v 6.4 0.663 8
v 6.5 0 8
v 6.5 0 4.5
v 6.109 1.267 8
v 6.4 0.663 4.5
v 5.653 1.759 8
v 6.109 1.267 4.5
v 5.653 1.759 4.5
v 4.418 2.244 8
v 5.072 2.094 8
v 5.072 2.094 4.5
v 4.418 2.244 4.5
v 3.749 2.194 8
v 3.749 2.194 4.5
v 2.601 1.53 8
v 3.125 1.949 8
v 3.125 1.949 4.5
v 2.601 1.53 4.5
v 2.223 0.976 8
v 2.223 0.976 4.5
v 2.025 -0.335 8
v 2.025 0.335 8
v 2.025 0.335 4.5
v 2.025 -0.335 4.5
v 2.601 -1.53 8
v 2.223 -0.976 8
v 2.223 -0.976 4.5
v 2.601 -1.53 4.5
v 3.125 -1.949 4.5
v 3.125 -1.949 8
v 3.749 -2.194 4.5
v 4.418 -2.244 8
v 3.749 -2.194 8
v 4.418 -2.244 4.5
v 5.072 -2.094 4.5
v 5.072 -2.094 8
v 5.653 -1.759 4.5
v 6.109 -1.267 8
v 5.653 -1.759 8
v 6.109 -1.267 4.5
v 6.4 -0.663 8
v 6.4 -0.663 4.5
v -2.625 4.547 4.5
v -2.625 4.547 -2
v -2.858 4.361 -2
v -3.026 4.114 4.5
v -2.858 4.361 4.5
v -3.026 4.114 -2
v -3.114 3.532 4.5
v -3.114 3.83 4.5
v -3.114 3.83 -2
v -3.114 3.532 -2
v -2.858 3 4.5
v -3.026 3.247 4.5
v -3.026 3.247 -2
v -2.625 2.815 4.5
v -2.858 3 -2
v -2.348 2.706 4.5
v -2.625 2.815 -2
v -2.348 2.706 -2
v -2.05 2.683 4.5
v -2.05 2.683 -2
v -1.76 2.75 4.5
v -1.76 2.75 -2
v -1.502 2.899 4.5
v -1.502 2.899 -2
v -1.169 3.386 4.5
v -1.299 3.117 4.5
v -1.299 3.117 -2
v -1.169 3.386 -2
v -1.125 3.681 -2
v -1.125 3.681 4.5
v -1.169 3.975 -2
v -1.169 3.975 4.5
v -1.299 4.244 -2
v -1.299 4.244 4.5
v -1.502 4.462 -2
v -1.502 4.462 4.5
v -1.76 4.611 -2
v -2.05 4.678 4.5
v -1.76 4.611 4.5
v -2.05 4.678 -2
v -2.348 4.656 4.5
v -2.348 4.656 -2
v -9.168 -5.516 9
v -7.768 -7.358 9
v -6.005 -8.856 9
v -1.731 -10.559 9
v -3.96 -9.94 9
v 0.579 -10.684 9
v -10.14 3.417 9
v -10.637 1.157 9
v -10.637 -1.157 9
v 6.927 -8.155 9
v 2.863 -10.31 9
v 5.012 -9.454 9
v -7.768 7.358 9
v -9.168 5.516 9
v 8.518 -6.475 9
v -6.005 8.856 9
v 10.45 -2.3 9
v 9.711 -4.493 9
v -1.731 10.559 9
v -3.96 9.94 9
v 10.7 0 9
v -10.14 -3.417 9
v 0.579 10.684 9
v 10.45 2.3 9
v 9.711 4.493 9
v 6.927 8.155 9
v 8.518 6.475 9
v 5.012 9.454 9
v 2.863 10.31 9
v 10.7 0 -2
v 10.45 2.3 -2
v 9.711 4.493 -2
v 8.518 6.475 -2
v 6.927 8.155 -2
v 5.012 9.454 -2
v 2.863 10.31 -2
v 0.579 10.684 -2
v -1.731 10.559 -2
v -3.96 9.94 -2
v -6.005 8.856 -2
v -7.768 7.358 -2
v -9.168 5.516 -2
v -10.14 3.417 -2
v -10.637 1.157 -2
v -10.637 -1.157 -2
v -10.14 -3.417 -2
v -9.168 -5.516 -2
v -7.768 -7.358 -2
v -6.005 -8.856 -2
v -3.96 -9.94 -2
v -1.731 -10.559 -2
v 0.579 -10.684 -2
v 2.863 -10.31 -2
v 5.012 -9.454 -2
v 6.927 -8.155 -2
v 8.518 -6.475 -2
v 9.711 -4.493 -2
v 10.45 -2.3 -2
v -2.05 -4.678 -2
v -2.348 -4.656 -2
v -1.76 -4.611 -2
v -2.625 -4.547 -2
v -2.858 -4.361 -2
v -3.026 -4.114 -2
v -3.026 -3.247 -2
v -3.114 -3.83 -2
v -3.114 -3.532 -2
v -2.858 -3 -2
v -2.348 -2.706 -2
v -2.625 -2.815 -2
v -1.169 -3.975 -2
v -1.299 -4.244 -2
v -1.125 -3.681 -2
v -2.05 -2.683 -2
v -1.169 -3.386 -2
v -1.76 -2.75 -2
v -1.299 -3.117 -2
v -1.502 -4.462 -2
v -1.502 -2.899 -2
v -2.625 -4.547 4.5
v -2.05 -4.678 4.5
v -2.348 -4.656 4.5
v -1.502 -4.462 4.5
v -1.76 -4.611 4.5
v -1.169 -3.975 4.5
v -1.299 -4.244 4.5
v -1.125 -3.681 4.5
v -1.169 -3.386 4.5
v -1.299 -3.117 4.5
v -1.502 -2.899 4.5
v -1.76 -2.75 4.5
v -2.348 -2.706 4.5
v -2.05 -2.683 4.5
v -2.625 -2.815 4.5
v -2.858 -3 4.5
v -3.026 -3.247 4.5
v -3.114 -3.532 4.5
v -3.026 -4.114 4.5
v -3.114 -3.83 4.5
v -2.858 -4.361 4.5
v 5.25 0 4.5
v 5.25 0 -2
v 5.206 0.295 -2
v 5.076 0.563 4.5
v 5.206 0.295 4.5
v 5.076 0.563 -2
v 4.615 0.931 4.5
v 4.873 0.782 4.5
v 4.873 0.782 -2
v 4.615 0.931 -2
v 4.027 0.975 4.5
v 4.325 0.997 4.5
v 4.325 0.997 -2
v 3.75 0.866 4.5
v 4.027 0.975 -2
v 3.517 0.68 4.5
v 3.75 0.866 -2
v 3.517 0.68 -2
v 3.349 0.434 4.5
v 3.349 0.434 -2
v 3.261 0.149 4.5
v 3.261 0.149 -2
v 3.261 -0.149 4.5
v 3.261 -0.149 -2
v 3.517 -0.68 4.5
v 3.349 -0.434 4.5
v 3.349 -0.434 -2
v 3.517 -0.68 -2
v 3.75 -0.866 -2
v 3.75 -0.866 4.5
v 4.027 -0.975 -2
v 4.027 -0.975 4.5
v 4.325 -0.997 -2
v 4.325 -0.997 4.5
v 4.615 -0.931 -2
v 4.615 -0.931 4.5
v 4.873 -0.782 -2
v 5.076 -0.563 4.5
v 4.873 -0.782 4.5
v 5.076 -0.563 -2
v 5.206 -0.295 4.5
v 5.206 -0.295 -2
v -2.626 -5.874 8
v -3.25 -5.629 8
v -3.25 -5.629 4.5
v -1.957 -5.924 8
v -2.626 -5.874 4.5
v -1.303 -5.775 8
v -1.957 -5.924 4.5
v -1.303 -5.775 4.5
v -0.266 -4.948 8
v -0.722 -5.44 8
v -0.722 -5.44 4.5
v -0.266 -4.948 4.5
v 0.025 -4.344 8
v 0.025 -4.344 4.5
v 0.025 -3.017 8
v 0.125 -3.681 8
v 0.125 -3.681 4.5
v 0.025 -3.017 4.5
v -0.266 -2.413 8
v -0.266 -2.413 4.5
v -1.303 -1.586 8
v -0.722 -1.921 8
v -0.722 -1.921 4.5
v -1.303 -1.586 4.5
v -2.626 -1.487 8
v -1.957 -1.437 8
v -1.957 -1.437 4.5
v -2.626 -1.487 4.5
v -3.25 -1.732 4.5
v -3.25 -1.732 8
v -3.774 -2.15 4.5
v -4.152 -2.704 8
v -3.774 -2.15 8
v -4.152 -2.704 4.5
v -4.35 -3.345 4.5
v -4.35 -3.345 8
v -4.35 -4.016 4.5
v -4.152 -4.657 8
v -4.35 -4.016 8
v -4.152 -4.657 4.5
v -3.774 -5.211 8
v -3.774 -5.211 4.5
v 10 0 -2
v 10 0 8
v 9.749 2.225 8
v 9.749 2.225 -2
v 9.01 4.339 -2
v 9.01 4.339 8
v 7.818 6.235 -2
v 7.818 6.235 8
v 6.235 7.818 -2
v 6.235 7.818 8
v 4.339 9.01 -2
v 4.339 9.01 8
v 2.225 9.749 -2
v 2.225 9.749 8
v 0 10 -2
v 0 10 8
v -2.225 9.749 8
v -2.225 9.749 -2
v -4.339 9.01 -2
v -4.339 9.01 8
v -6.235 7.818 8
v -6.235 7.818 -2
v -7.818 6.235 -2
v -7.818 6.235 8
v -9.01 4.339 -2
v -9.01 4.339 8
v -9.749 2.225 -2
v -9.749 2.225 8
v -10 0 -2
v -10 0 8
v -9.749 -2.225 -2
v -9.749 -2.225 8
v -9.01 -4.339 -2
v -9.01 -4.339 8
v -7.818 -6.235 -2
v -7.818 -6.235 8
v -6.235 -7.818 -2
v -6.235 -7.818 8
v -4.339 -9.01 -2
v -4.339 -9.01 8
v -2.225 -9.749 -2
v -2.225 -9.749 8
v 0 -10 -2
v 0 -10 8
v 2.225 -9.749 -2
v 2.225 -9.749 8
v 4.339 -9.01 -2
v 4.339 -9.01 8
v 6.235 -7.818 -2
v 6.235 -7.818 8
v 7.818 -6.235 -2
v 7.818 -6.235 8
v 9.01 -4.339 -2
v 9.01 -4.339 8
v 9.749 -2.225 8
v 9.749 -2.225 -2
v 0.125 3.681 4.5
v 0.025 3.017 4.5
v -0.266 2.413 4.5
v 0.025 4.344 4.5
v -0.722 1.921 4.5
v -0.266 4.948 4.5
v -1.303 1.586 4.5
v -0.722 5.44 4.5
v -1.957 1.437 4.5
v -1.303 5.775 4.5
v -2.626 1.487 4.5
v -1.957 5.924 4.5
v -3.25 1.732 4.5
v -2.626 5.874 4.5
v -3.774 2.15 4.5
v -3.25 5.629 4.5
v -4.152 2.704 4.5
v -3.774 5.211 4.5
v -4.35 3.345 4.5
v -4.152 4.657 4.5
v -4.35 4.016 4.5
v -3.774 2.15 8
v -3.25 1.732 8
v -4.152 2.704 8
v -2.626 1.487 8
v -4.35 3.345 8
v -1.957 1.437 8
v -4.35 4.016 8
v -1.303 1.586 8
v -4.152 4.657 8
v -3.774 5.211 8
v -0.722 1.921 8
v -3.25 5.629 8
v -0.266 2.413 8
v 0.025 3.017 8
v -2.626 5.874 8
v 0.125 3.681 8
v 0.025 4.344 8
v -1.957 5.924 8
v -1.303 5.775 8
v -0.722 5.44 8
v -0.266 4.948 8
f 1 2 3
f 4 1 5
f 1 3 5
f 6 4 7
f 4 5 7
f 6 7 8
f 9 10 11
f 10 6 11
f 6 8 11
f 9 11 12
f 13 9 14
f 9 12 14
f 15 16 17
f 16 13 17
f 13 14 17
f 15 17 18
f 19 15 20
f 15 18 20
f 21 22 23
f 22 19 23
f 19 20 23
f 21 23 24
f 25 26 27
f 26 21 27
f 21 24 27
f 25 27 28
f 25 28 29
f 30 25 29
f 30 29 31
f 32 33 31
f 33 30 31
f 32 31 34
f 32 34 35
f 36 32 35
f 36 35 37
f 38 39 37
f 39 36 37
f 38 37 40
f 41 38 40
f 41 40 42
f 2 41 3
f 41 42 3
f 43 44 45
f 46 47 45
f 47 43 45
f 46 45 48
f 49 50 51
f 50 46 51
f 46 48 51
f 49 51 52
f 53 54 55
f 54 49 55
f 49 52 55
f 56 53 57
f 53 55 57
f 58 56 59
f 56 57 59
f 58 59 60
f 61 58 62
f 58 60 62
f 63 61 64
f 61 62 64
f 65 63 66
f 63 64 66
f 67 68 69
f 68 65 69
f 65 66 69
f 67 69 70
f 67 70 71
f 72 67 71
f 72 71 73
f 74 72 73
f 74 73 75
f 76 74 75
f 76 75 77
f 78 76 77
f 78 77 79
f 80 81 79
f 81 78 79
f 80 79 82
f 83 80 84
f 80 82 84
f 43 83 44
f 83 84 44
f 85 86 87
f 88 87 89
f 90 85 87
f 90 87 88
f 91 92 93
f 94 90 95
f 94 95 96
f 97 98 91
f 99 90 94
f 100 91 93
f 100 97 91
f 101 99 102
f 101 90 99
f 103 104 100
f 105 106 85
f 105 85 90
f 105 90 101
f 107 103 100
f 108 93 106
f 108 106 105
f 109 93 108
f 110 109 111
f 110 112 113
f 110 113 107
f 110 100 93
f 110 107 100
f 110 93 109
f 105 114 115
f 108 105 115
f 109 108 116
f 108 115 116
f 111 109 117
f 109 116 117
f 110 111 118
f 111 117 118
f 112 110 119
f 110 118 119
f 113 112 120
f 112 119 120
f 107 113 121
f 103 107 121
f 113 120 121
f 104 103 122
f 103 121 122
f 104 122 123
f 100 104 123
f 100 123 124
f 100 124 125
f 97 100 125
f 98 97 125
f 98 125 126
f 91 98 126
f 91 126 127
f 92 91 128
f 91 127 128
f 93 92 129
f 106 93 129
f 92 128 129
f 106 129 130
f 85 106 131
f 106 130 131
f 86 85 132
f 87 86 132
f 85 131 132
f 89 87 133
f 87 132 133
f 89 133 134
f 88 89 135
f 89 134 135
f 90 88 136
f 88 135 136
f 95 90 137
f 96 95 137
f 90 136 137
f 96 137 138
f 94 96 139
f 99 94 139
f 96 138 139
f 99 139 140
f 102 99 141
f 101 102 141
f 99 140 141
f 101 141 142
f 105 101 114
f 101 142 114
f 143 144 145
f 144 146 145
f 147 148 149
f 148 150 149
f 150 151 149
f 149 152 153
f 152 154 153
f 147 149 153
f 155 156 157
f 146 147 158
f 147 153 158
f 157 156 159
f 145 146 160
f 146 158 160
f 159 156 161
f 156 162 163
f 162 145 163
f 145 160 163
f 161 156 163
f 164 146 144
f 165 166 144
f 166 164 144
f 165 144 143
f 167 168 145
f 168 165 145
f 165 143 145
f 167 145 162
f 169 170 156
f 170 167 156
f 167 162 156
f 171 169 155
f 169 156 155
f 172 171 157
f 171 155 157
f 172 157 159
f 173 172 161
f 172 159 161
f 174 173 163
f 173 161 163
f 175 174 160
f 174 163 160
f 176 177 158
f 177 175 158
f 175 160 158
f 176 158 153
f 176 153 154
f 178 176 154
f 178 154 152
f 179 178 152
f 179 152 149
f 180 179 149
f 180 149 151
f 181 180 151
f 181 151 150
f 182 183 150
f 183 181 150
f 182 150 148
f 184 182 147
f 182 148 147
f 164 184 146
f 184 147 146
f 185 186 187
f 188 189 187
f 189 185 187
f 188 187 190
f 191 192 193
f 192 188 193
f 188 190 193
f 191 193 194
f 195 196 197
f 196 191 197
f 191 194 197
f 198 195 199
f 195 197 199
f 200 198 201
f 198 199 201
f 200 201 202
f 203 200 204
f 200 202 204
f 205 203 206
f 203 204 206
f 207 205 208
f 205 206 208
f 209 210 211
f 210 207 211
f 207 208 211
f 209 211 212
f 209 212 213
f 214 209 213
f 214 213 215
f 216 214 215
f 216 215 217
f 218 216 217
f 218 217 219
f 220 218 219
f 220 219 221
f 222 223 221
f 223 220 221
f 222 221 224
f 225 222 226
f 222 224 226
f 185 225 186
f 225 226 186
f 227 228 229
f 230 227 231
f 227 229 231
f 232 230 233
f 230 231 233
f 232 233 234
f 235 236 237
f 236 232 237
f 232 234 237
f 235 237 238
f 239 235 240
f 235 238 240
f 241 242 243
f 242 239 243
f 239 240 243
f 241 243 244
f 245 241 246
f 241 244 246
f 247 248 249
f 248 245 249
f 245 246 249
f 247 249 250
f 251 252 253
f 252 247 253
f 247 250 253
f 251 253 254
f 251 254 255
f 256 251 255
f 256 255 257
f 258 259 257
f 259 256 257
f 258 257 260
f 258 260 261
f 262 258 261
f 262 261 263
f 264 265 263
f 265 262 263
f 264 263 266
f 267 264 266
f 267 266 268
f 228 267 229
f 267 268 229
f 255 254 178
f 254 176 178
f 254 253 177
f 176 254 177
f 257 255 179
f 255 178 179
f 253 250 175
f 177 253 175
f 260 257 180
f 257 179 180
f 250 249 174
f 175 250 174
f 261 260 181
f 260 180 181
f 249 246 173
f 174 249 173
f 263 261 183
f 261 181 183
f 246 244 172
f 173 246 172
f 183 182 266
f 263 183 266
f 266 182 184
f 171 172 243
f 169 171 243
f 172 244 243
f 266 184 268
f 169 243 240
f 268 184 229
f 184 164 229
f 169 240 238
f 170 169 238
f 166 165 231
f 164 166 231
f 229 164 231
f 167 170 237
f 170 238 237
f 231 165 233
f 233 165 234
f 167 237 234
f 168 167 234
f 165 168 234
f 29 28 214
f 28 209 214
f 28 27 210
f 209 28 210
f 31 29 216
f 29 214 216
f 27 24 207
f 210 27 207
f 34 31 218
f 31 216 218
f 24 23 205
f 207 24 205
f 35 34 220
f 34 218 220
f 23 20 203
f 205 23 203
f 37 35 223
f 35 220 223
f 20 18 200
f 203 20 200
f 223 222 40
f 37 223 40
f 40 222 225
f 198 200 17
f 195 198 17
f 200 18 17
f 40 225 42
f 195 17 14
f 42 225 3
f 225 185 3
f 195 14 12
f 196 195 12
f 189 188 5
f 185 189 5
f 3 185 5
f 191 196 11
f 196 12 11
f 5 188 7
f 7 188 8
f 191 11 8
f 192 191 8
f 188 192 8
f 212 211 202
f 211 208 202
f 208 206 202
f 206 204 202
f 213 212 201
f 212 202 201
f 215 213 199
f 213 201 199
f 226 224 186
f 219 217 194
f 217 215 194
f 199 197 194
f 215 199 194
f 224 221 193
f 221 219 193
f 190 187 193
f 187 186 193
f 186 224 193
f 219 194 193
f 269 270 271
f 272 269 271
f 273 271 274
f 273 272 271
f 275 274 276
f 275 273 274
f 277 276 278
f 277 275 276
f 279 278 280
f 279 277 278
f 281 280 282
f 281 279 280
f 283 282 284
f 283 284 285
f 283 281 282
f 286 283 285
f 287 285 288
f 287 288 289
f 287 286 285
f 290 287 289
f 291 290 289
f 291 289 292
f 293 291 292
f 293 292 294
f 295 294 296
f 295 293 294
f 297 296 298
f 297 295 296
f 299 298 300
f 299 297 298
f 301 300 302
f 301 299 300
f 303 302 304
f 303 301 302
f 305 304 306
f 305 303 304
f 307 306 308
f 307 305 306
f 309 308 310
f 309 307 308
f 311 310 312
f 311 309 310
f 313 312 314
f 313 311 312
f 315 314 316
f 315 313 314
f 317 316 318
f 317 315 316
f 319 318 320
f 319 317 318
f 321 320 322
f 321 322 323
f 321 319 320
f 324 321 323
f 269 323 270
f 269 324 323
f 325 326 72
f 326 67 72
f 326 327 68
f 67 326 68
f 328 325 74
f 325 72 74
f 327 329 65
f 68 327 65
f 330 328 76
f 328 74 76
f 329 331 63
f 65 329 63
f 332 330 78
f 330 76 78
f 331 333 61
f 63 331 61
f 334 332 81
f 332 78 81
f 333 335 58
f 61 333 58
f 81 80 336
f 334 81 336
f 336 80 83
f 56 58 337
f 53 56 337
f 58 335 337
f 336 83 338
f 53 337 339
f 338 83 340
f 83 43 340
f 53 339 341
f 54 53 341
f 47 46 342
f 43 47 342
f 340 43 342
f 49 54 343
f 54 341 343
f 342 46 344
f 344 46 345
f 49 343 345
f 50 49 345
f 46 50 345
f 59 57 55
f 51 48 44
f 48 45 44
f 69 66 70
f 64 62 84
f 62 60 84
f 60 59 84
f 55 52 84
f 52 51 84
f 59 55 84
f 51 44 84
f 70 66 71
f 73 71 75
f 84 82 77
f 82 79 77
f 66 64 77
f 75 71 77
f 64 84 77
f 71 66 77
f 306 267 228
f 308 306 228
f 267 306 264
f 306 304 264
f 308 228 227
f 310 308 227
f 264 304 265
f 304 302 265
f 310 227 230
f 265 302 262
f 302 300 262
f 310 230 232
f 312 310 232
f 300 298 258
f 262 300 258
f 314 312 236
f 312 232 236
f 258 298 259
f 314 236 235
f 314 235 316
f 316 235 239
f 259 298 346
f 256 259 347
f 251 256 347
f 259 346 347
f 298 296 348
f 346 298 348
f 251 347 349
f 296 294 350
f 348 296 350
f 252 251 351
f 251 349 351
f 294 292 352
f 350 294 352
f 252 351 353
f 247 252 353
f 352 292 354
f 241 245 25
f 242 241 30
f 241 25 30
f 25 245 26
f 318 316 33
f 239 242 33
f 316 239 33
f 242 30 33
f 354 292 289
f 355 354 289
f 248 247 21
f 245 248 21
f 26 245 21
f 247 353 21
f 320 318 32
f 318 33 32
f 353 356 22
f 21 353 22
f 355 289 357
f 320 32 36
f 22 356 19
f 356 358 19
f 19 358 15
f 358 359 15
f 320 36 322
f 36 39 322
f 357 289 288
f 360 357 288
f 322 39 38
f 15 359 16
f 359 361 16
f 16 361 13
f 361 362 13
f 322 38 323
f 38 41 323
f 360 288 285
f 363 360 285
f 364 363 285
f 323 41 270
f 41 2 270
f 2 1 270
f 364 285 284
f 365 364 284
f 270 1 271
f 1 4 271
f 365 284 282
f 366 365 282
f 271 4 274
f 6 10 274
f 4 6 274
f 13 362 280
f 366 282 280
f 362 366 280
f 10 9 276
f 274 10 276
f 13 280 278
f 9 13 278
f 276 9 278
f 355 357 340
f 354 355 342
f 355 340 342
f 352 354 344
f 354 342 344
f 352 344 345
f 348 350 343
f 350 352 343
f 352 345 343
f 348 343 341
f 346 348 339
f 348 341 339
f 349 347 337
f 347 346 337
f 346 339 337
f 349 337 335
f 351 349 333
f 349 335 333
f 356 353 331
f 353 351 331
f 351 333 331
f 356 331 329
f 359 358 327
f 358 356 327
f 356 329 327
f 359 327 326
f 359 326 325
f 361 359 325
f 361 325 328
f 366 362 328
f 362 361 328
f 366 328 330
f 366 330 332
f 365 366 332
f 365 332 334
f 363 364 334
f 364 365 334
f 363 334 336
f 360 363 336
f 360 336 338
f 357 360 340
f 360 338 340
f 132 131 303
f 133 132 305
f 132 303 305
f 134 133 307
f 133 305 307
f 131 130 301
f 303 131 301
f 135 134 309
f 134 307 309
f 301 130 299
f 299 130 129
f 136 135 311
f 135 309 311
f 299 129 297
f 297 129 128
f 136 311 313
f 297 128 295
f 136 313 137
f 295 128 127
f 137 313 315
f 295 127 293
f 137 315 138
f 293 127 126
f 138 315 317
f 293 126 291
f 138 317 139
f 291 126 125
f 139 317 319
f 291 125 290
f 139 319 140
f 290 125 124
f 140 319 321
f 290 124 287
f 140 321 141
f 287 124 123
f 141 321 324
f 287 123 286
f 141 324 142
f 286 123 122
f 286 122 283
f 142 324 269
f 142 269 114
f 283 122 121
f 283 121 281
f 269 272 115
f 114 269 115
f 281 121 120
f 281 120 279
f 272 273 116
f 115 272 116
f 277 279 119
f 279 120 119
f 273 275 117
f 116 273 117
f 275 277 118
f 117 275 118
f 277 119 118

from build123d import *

# Parameters (mm, degrees)
CYLINDER157_R     = 2.25
CYLINDER157_DEPTH = 7
CYLINDER156_R     = 1
CYLINDER156_DEPTH = 14
CYLINDER147_R     = 1
CYLINDER147_DEPTH = 1
ARRAY_COUNT       = 3
CYLINDER153_R     = 10
CYLINDER153_DEPTH = 10
CYLINDER_R        = 10.7
CYLINDER_DEPTH    = 11


with BuildPart() as sealsubtraction:
    # Cylinder157 → Cylinder157 (new body)
    with BuildSketch(Plane.XY.offset(4.5)):
        Circle(CYLINDER157_R)
    extrude(amount=CYLINDER157_DEPTH)


with BuildPart() as bottomwireoutlet:
    # Cylinder156 → Cylinder156 (new body)
    with BuildSketch(Plane.XY.offset(-7)):
        Circle(CYLINDER156_R)
    extrude(amount=CYLINDER156_DEPTH)


with BuildPart() as sealarray:
    # Cylinder147 → Cylinder147 (new body)
    with BuildSketch(Plane.XY.offset(4.5)):
        Circle(CYLINDER147_R)
    extrude(amount=CYLINDER147_DEPTH)

    # Fusion: union SealSubtraction, BottomWireOutlet
    add(sealsubtraction.part)
    add(bottomwireoutlet.part)


with BuildPart() as sealarray_1:
    # Fusion placement: moved
    add(sealarray.part.moved(Location((4.25, 0, 0))))

    # Array: SealArray ×3 about axis
    array_axis = Axis((0, 0, 0), (0, 0, 1))


with BuildPart() as sealarray_2:
    add(sealarray_1.part)
    for i in range(1, ARRAY_COUNT):
        add(sealarray_1.part.rotate(array_axis, i * 360 / ARRAY_COUNT))


with BuildPart() as cut:
    # Cylinder153 → Cylinder153 (new body)
    with BuildSketch(Plane.XY.offset(-2)):
        Circle(CYLINDER153_R)
    extrude(amount=CYLINDER153_DEPTH)

    # Cut: cut SealArray
    add(sealarray_2.part, mode=Mode.SUBTRACT)


with BuildPart() as cut027:
    # Cylinder → Cylinder (new body)
    with BuildSketch(Plane.XY.offset(-2)):
        Circle(CYLINDER_R)
    extrude(amount=CYLINDER_DEPTH)

    # Cut027: cut Cut
    add(cut.part, mode=Mode.SUBTRACT)


solid = cut027.part
